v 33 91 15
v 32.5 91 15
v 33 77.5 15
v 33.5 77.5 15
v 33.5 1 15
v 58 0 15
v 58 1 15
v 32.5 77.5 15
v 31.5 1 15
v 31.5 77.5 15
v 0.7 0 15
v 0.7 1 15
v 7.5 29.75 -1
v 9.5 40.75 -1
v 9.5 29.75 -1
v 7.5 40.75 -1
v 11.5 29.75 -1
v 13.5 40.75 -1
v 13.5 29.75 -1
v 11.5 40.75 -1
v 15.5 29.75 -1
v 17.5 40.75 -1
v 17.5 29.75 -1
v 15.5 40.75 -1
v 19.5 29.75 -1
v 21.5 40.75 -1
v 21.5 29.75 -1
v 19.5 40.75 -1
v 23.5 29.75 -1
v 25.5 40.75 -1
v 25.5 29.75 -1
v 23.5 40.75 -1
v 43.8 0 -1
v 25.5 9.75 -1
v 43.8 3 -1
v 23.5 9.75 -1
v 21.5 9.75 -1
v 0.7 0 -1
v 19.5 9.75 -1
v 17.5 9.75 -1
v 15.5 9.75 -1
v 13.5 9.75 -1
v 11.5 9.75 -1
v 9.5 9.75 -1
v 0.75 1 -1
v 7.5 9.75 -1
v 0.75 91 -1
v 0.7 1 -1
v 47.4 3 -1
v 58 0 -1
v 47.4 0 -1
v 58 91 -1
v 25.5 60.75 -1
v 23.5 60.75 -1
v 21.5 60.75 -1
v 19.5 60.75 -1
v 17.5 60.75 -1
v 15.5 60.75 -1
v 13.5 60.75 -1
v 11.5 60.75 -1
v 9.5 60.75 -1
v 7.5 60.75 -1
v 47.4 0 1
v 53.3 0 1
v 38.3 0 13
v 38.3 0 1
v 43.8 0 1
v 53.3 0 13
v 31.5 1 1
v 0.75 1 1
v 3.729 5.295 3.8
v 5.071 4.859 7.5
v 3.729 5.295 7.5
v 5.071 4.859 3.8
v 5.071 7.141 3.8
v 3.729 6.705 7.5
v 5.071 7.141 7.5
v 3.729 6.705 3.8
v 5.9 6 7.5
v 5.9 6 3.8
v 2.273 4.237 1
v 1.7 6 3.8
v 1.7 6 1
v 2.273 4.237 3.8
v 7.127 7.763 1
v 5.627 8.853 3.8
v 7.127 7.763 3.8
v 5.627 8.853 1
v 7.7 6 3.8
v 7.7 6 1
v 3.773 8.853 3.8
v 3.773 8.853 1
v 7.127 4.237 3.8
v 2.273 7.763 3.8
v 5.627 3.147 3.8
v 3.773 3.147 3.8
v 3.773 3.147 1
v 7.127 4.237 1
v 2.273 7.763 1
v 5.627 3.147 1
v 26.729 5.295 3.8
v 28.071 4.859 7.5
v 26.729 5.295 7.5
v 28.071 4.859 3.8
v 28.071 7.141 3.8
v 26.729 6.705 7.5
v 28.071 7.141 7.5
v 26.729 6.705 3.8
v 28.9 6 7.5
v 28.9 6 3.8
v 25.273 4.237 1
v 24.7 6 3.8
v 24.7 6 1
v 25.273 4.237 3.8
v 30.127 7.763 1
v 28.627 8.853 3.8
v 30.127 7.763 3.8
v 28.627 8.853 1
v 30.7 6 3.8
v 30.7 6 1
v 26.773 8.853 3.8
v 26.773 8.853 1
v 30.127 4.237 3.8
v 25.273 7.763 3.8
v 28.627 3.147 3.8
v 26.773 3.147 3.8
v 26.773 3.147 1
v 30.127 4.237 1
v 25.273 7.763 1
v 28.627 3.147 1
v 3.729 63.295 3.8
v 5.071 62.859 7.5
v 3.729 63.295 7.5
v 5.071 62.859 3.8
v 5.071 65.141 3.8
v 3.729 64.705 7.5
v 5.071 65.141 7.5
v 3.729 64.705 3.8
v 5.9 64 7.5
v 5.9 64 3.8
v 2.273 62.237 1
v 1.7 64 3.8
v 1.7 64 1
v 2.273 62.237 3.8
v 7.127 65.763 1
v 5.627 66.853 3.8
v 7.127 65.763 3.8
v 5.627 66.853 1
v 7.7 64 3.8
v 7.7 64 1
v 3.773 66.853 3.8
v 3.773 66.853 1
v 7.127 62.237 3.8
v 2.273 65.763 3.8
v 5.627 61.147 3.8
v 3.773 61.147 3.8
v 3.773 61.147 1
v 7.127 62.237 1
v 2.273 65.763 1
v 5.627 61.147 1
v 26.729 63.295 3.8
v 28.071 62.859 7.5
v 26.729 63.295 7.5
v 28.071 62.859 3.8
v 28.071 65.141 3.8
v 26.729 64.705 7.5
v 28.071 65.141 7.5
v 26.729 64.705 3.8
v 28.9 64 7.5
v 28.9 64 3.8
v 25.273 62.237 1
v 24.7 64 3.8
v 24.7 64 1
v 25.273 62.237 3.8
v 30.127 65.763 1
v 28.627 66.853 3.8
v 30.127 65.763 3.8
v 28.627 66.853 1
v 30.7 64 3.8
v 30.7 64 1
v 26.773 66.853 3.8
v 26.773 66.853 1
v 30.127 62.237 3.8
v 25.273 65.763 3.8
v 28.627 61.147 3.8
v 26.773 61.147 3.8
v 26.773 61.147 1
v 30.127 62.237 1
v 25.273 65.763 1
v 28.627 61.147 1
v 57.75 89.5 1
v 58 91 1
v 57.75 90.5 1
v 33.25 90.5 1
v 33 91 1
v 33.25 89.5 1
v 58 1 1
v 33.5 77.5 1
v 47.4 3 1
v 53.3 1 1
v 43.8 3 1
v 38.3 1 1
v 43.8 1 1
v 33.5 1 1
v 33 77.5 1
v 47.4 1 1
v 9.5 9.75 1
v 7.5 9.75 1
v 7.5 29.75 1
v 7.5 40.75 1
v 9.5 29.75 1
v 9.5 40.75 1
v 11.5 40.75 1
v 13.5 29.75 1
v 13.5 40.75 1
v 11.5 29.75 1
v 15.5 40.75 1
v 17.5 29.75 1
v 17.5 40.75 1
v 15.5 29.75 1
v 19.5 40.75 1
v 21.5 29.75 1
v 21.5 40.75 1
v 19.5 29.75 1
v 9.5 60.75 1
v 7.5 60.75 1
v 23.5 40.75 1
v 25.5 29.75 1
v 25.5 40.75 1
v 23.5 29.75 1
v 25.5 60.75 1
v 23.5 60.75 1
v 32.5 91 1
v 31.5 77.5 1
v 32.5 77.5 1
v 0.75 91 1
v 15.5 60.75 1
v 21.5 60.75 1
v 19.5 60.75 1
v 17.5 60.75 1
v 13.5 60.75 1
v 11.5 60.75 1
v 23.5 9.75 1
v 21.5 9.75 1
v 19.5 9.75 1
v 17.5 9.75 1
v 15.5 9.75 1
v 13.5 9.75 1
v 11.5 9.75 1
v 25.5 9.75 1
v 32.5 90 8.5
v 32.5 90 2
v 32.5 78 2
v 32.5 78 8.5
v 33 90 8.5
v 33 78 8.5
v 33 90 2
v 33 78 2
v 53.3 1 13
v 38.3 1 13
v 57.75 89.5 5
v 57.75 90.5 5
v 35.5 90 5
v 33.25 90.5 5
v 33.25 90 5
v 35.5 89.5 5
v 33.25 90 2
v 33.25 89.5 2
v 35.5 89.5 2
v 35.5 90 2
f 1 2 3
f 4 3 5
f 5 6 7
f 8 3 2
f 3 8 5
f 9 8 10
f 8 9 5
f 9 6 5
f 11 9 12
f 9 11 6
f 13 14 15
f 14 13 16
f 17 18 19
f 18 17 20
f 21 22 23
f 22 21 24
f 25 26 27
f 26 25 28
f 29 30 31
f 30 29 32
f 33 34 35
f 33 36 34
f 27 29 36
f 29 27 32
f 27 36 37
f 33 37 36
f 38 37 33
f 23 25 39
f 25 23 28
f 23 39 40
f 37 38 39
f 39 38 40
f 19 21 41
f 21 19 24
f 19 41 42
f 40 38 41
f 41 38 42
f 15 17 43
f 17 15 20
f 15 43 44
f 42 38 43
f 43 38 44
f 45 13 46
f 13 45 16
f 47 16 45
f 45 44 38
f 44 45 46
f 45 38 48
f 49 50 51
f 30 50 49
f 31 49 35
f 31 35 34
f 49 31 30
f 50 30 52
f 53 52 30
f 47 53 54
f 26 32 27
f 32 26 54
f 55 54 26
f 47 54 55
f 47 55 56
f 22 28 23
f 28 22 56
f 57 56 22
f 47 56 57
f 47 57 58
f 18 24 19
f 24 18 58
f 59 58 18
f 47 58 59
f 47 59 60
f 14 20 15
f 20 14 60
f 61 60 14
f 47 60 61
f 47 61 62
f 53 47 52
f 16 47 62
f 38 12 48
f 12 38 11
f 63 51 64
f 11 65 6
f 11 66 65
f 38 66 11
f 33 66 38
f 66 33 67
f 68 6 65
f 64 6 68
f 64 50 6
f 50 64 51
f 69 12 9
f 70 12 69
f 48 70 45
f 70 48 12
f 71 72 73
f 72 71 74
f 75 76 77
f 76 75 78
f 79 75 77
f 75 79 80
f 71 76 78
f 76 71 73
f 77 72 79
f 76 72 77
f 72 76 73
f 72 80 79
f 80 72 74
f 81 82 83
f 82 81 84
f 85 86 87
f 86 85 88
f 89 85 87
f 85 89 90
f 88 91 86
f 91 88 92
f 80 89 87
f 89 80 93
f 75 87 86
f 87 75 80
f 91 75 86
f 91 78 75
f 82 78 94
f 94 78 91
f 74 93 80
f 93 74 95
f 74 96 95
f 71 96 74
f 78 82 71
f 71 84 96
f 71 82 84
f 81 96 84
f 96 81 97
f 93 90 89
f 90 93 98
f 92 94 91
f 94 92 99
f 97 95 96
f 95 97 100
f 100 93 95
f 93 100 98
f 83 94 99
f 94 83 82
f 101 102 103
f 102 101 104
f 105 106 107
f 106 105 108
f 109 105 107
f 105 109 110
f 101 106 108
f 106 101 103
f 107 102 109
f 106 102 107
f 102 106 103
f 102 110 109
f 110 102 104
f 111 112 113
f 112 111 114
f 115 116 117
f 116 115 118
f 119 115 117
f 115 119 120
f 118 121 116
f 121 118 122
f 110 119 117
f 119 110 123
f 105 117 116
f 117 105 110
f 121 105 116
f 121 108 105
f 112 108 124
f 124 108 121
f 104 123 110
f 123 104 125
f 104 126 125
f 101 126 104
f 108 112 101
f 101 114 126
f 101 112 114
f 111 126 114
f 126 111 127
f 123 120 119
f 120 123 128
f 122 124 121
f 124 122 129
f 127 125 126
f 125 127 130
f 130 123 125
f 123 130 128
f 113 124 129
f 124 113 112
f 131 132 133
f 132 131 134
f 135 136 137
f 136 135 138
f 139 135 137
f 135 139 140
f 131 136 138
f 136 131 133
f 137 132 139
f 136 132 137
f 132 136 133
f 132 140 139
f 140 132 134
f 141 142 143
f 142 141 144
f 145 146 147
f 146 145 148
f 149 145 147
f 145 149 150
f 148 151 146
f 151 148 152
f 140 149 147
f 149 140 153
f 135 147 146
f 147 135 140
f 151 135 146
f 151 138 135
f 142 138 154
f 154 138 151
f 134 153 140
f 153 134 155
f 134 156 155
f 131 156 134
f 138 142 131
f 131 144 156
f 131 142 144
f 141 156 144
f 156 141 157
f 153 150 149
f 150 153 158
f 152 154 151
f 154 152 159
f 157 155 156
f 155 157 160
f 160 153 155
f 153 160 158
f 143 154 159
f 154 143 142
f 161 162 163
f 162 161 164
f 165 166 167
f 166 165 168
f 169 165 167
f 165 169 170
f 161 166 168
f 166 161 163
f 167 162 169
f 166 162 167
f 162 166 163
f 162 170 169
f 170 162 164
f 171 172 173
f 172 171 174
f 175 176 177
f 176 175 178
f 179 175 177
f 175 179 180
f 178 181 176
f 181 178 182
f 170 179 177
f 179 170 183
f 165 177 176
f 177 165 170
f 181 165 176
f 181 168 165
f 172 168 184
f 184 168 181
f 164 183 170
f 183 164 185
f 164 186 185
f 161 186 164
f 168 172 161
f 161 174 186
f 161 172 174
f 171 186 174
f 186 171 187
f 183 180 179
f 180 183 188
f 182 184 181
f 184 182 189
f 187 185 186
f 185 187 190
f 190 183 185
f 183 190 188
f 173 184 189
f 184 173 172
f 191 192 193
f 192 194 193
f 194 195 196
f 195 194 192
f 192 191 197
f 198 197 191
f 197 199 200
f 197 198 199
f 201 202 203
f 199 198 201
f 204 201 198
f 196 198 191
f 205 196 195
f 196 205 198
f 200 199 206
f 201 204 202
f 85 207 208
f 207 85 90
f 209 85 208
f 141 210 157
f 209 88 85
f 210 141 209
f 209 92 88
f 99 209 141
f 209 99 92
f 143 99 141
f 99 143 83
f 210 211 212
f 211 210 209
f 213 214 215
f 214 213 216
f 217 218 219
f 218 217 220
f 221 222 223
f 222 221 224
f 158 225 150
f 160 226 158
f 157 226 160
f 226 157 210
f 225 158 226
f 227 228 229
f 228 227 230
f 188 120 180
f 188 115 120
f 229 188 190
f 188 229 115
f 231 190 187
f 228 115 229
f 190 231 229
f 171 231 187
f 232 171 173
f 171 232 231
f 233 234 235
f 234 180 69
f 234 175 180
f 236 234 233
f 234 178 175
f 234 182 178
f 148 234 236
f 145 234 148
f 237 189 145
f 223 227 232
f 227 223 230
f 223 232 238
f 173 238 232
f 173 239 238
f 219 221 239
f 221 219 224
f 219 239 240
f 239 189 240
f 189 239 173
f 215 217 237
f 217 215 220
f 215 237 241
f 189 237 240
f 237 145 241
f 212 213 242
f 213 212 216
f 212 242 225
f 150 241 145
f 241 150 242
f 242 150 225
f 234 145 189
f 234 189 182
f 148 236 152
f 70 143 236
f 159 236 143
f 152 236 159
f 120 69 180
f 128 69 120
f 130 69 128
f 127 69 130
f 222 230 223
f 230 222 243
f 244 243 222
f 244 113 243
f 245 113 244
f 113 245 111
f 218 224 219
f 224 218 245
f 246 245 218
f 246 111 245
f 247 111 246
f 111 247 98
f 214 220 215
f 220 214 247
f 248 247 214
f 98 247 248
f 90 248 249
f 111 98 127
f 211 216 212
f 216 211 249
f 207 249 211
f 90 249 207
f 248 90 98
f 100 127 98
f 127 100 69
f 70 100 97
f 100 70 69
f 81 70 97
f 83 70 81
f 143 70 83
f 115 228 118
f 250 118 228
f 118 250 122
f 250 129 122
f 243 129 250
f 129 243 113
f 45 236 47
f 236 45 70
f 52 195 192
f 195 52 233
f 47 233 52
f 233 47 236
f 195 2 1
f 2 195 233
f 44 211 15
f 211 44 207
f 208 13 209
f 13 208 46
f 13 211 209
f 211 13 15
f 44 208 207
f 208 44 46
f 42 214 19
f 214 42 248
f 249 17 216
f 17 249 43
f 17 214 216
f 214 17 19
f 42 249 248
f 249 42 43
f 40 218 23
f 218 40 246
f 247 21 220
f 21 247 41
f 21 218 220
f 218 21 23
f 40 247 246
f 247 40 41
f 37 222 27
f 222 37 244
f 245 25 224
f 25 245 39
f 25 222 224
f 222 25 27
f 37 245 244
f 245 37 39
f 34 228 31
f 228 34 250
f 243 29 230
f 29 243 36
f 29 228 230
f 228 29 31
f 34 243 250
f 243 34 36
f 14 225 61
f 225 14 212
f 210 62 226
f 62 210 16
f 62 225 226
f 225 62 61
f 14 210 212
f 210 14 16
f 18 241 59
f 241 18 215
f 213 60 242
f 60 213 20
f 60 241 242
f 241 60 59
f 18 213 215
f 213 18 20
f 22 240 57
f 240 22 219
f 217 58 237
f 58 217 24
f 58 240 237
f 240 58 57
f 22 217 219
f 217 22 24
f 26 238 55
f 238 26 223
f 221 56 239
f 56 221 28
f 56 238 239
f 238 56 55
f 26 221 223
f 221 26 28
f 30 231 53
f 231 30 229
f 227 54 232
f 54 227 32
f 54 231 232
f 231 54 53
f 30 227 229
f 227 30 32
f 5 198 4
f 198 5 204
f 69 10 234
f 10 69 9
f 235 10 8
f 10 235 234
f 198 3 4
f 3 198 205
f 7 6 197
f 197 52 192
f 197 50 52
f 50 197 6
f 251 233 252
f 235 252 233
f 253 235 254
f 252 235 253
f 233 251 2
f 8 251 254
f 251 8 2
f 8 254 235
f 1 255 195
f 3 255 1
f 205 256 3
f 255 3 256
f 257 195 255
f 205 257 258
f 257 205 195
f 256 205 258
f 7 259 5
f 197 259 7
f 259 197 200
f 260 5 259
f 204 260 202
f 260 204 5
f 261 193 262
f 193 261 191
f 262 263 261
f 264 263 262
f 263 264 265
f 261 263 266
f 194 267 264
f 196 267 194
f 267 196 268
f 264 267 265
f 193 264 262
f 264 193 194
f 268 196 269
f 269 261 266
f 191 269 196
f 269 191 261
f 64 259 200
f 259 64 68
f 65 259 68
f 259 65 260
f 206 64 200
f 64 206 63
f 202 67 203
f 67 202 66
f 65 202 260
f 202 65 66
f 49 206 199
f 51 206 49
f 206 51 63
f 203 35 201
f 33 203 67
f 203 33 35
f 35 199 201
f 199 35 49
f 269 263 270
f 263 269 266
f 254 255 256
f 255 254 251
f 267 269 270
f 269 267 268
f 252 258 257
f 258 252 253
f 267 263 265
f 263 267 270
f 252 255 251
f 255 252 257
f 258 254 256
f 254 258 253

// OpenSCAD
use <MCAD/boxes.scad>
//use <OPENSCAD/Autobot_Latches.scad>

width = 25.5;
depth = 91;
height = 14;
wall = 2;

usb_height = 6.5;
usb_width = 2;
usb_depth = 13.75;

module rpi_hub(width=24.1, depth=90, height=14, wall=2){

    // The main hub case
    translate([width/2, depth/2,height/2]){
        difference(){
            // Account for the hub platform being 2 mm thick
            cube([width,depth,height+wall], true);
            translate([1,1,0]){
                cube([width-wall+3,depth,height+wall*2], true);
            }
        }
        // Holder for hub card
        translate([-12,44,-6]){
            cube([width-1,1,4]);
        }
    }

    // bottom portion
    translate([width/2, depth/2,0]){
        cube([width,depth,wall],true);
    }
}

// USB port
module usb_port(width=usb_width,depth=usb_depth,height=usb_height){ 
    //height=5.75; // z-axis
    //width=2;  // x-axis
   //depth=13.25; // y-axis
    cube([4, depth, height]);
}

module eth_jack(){
    //Ethernet Jack
    e_width = 15;
    e_height = 1;
    e_depth = 12.0;

    x = 5.8;
    y = 0;
    z = 1;
    translate([x,y,z]){
        cube([e_width, e_height, e_depth]);
        translate([5.5,0,-2]){
            cube([3.6, 3, 3]);
        }
    }
}

module eth_hub(){
    // USB Ports
    offset_z_1 = 6.4;
    offset_y_1 = 30.35;
    offset_x_1 = 24.1;
    
    offset_z_2 = 6.4;
    offset_y_2 = offset_y_1 + 6+ usb_depth;
    offset_x_2 = 24.1;
    
    offset_z_3 = 6.4;
    offset_y_3 = offset_y_2 + 4 + usb_depth;
    offset_x_3 = 24.1;
    
    difference(){
        // Bottom piece
        rpi_hub(width,depth,height,wall);
        
        // Ethernet
        eth_jack();
                
        // Power
        p_depth = 7.4;
        p_height = 6.5;
        p_width = 2;
    
        translate([-1,78,2]){
            cube([4, 12, 6.5]);
        }
    }
}

module usb_micro(x=0,y=0,z=0){
    usb_micro_port_width = 8.75-.9;
    usb_micro_port_height = 3.4;

        translate([x,y,z]){
            cube([wall,usb_micro_port_width,usb_micro_port_height]);
        }
}

module hdmi(x=0,y=0,z=0){
    hdmi_port_width = 12.25;
    hdmi_port_height = 4.25-.3;

        translate([x,y,z]){
            cube([wall,hdmi_port_width,hdmi_port_height]);
        }
}

module vent(x=0,y=0,z=0){
    translate([x,y,z]){
        cube([2,20,wall]);
    }
 }


// RPI
module rpi_box(){
    box_width = 33;
    box_depth =92;
    box_height = 14;
    wall = 2;
    
    usb_micro_port_width = 8.75;
    usb_micro_port_height = 3.4;
    
    hdmi_port_width = 12.25;
    hdmi_port_height = 4.25;

    // The main hub case
    translate([box_width/2+.25, box_depth/2,box_height/2]){
        difference(){
            // Account for the hub platform being 2 mm thick
            cube([box_width-.9,box_depth,box_height+wall], true);
            translate([1,1,0]){
                cube([box_width+1.5,box_depth,box_height+wall*2], true);
            }
        }
    }
    
    // bottom portion
    translate([box_width/2+.5, box_depth/2,0]){
        cube([box_width-.5,box_depth-2,wall],true);
    }

    translate([4.7,6,0]){
        cylinder(7.5, d=2.4);
        // rest portion
        cylinder(3.8,d=6);
    }

    translate([27.7,6,0]){
        cylinder(7.5, d=2.4);
        
        // rest portion
        cylinder(3.8,d=6);
    }

    translate([4.7,64,0]){
        cylinder(7.5, d=2.4);

        // rest portion
        cylinder(3.8,d=6);
    }

    translate([27.7,64,0]){
        cylinder(7.5, d=2.4);

        // rest portion
        cylinder(3.8,d=6);
    }

}

module rpi_bottom(){
    difference(){
        rpi_box(); 
    
        usb_micro(x=0,y=21+1.35,z=5.3);
        usb_micro(x=0,y=8.5+1.35,z=5.3);
        hdmi(x=0, y=48+1.35,z=4.8);   
        
        vent(x=7.5,y=9.75,z=-1);
        vent(x=11.5,y=9.75,z=-1);
        vent(x=15.5,y=9.75,z=-1);
        vent(x=19.5,y=9.75,z=-1);
        vent(x=23.5,y=9.75,z=-1);
    
        vent(x=7.5,y=40.75,z=-1);
        vent(x=11.5,y=40.75,z=-1);
        vent(x=15.5,y=40.75,z=-1);
        vent(x=19.5,y=40.75,z=-1);
        vent(x=23.5,y=40.75,z=-1);

    }
}


module lid(){
    
    offset_z_1 = 6.4;
    offset_y_1 = 30.35;
    offset_x_1 = 24.1;
    
    offset_z_2 = 6.4;
    offset_y_2 = offset_y_1 + 6+ usb_depth;
    offset_x_2 = 24.1;
    
    offset_z_3 = 6.4;
    offset_y_3 = offset_y_2 + 4 + usb_depth;
    offset_x_3 = 24.1;
    
    // outer casing
    difference(){
        translate([0,0,1]){
            difference(){
                cube([59.5,92,17.5]);
                translate([1,0,0]){
                    cube([57.5,91,17.5]);
                }
            }
        }
        
        // RPI ports
        usb_micro(x=58.5,y=21+1.35,z=5.55+wall);
        usb_micro(x=58.5,y=8.5+1.35,z=5.55+wall);
        hdmi(x=58.5, y=48+1.35,z=5.55+wall);   

        // USB Port 1
        translate([-1, offset_y_1-wall+.5,2.3+wall]){
            usb_port();
        }
    
        // USB Port 2
        translate([-1, offset_y_2-3,2.3+wall]){
            usb_port();
        }
        
        // USB Port 3
        translate([-1,offset_y_3-1.9,2.3+wall]){
            usb_port();
        }
    }

    // Y axis Rail
    translate([1,0,17.5]){
        cube([4,92,1]);
    }

    // Y axis Rail opposite side
    translate([54,0,17.5]){
        cube([5,92,1]);
    }

    // X axis rail
    translate([0,80,17.5]){
        cube([58,12,1]);
    }

    // Top portion
    cube([59.5,92,1]);

}

translate([0,0,0]){
    rpi_bottom();
    translate([31.5,0,0]){
        cube([2,depth-13.5,15]);
    }
}
translate([32.5,0,0]){
    eth_hub();
}

//translate([0,69,-1]){
//    difference(){
//        cube([34,23,16]);
//        translate([2,0,2]){
//            cube([33,21.5,14]);
//        }
//    }
//
//}

//translate([0,0,16.25]){
translate([59.5, 0, 16.25]){
//translate([65, 0, 16]){
//    rotate(a=[0,180,0]){
        rotate([0,180,0]){
//            lid();
        }
//    }
}
